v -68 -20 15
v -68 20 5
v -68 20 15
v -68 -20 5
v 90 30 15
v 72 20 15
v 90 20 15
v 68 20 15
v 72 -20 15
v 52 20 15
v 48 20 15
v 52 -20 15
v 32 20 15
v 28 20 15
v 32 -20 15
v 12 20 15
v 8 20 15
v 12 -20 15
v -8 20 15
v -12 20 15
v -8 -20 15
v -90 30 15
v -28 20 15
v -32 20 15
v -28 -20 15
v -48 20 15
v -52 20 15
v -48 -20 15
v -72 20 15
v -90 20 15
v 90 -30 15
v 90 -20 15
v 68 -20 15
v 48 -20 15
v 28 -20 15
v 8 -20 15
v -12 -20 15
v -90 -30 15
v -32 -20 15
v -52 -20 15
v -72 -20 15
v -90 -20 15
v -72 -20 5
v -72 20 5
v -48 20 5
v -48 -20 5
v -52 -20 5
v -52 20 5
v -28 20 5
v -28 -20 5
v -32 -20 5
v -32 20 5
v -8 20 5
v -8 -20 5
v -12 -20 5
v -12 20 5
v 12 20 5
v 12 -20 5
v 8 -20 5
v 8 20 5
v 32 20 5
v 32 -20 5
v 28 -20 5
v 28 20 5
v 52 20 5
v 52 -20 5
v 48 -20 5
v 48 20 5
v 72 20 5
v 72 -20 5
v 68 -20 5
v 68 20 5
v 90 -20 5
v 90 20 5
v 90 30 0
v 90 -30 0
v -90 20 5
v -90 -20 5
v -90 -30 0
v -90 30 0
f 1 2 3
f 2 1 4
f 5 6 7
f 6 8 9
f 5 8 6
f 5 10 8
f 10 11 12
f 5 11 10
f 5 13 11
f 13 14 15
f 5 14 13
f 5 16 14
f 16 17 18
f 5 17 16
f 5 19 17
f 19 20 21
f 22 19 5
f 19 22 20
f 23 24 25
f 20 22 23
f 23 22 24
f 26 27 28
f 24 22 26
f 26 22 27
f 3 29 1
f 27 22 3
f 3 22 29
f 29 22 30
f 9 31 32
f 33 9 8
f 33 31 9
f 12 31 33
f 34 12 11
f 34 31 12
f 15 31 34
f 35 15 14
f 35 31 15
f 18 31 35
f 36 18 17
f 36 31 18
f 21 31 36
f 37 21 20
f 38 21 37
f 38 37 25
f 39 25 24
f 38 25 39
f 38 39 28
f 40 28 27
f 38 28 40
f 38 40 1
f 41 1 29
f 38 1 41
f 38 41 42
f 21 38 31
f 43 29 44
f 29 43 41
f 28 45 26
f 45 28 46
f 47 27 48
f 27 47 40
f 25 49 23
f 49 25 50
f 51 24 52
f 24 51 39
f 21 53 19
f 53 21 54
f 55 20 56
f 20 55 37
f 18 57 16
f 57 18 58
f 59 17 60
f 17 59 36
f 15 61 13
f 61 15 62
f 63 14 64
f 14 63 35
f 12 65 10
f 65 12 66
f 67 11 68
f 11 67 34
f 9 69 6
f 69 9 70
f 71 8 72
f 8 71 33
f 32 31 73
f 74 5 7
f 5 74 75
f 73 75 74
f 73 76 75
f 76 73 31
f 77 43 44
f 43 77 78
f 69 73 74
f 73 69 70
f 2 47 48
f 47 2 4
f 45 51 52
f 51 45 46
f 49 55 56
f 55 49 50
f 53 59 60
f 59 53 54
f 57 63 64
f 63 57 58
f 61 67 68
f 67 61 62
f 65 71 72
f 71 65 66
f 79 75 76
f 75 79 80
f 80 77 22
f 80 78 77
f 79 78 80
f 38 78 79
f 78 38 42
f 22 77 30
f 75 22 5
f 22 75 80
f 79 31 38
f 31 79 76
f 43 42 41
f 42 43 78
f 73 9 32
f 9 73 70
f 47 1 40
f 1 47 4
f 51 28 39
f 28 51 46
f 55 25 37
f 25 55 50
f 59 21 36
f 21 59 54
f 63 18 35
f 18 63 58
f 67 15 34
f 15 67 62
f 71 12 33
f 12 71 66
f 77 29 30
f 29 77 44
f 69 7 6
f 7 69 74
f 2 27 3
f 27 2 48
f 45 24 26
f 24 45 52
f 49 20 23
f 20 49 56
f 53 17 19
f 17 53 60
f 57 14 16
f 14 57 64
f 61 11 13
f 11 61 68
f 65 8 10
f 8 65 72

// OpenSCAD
$fn = 32;

// ----------------------------------------------------------------------
// Rib frame 180 x 60 x 15
// 8 ribs at 20 mm pitch
// ----------------------------------------------------------------------

// --- parameters (mm) ---
frame = [180, 60, 5];  // base plate size (x, y, z)
rail_w = 10;           // side rail width
ribs = 8;              // number of ribs
rib_t = 4;             // rib thickness
rib_h = 10;            // rib height above the base plate
pitch = 20;            // pitch between rib centres

// --- derived feature positions (mm) ---
span = (ribs - 1) * pitch;          // = 140   distance between the outer ribs
origin_x = -span / 2;               // = -70   X of the first rib
rib_len = frame[1] - 2 * rail_w + 2;  // = 42   rib length, 1 mm into each rail
feature_centers = [
  [origin_x + 0 * pitch, 0],
  [origin_x + 1 * pitch, 0],
  [origin_x + 2 * pitch, 0],
  [origin_x + 3 * pitch, 0],
  [origin_x + 4 * pitch, 0],
  [origin_x + 5 * pitch, 0],
  [origin_x + 6 * pitch, 0],
  [origin_x + 7 * pitch, 0]
];   // rib centre line, drives the rib loop

// base plate, two side rails, then the ribs read straight off feature_centers
union() {
  translate([-frame[0] / 2, -frame[1] / 2, 0]) cube(frame);
  translate([-frame[0] / 2, -frame[1] / 2, 0]) cube([frame[0], rail_w, frame[2] + rib_h]);
  translate([-frame[0] / 2, frame[1] / 2 - rail_w, 0]) cube([frame[0], rail_w, frame[2] + rib_h]);
  for (centre = feature_centers)
    translate([centre[0] - rib_t / 2, centre[1] - rib_len / 2, frame[2] - 1])
      cube([rib_t, rib_len, rib_h + 1]);
}
